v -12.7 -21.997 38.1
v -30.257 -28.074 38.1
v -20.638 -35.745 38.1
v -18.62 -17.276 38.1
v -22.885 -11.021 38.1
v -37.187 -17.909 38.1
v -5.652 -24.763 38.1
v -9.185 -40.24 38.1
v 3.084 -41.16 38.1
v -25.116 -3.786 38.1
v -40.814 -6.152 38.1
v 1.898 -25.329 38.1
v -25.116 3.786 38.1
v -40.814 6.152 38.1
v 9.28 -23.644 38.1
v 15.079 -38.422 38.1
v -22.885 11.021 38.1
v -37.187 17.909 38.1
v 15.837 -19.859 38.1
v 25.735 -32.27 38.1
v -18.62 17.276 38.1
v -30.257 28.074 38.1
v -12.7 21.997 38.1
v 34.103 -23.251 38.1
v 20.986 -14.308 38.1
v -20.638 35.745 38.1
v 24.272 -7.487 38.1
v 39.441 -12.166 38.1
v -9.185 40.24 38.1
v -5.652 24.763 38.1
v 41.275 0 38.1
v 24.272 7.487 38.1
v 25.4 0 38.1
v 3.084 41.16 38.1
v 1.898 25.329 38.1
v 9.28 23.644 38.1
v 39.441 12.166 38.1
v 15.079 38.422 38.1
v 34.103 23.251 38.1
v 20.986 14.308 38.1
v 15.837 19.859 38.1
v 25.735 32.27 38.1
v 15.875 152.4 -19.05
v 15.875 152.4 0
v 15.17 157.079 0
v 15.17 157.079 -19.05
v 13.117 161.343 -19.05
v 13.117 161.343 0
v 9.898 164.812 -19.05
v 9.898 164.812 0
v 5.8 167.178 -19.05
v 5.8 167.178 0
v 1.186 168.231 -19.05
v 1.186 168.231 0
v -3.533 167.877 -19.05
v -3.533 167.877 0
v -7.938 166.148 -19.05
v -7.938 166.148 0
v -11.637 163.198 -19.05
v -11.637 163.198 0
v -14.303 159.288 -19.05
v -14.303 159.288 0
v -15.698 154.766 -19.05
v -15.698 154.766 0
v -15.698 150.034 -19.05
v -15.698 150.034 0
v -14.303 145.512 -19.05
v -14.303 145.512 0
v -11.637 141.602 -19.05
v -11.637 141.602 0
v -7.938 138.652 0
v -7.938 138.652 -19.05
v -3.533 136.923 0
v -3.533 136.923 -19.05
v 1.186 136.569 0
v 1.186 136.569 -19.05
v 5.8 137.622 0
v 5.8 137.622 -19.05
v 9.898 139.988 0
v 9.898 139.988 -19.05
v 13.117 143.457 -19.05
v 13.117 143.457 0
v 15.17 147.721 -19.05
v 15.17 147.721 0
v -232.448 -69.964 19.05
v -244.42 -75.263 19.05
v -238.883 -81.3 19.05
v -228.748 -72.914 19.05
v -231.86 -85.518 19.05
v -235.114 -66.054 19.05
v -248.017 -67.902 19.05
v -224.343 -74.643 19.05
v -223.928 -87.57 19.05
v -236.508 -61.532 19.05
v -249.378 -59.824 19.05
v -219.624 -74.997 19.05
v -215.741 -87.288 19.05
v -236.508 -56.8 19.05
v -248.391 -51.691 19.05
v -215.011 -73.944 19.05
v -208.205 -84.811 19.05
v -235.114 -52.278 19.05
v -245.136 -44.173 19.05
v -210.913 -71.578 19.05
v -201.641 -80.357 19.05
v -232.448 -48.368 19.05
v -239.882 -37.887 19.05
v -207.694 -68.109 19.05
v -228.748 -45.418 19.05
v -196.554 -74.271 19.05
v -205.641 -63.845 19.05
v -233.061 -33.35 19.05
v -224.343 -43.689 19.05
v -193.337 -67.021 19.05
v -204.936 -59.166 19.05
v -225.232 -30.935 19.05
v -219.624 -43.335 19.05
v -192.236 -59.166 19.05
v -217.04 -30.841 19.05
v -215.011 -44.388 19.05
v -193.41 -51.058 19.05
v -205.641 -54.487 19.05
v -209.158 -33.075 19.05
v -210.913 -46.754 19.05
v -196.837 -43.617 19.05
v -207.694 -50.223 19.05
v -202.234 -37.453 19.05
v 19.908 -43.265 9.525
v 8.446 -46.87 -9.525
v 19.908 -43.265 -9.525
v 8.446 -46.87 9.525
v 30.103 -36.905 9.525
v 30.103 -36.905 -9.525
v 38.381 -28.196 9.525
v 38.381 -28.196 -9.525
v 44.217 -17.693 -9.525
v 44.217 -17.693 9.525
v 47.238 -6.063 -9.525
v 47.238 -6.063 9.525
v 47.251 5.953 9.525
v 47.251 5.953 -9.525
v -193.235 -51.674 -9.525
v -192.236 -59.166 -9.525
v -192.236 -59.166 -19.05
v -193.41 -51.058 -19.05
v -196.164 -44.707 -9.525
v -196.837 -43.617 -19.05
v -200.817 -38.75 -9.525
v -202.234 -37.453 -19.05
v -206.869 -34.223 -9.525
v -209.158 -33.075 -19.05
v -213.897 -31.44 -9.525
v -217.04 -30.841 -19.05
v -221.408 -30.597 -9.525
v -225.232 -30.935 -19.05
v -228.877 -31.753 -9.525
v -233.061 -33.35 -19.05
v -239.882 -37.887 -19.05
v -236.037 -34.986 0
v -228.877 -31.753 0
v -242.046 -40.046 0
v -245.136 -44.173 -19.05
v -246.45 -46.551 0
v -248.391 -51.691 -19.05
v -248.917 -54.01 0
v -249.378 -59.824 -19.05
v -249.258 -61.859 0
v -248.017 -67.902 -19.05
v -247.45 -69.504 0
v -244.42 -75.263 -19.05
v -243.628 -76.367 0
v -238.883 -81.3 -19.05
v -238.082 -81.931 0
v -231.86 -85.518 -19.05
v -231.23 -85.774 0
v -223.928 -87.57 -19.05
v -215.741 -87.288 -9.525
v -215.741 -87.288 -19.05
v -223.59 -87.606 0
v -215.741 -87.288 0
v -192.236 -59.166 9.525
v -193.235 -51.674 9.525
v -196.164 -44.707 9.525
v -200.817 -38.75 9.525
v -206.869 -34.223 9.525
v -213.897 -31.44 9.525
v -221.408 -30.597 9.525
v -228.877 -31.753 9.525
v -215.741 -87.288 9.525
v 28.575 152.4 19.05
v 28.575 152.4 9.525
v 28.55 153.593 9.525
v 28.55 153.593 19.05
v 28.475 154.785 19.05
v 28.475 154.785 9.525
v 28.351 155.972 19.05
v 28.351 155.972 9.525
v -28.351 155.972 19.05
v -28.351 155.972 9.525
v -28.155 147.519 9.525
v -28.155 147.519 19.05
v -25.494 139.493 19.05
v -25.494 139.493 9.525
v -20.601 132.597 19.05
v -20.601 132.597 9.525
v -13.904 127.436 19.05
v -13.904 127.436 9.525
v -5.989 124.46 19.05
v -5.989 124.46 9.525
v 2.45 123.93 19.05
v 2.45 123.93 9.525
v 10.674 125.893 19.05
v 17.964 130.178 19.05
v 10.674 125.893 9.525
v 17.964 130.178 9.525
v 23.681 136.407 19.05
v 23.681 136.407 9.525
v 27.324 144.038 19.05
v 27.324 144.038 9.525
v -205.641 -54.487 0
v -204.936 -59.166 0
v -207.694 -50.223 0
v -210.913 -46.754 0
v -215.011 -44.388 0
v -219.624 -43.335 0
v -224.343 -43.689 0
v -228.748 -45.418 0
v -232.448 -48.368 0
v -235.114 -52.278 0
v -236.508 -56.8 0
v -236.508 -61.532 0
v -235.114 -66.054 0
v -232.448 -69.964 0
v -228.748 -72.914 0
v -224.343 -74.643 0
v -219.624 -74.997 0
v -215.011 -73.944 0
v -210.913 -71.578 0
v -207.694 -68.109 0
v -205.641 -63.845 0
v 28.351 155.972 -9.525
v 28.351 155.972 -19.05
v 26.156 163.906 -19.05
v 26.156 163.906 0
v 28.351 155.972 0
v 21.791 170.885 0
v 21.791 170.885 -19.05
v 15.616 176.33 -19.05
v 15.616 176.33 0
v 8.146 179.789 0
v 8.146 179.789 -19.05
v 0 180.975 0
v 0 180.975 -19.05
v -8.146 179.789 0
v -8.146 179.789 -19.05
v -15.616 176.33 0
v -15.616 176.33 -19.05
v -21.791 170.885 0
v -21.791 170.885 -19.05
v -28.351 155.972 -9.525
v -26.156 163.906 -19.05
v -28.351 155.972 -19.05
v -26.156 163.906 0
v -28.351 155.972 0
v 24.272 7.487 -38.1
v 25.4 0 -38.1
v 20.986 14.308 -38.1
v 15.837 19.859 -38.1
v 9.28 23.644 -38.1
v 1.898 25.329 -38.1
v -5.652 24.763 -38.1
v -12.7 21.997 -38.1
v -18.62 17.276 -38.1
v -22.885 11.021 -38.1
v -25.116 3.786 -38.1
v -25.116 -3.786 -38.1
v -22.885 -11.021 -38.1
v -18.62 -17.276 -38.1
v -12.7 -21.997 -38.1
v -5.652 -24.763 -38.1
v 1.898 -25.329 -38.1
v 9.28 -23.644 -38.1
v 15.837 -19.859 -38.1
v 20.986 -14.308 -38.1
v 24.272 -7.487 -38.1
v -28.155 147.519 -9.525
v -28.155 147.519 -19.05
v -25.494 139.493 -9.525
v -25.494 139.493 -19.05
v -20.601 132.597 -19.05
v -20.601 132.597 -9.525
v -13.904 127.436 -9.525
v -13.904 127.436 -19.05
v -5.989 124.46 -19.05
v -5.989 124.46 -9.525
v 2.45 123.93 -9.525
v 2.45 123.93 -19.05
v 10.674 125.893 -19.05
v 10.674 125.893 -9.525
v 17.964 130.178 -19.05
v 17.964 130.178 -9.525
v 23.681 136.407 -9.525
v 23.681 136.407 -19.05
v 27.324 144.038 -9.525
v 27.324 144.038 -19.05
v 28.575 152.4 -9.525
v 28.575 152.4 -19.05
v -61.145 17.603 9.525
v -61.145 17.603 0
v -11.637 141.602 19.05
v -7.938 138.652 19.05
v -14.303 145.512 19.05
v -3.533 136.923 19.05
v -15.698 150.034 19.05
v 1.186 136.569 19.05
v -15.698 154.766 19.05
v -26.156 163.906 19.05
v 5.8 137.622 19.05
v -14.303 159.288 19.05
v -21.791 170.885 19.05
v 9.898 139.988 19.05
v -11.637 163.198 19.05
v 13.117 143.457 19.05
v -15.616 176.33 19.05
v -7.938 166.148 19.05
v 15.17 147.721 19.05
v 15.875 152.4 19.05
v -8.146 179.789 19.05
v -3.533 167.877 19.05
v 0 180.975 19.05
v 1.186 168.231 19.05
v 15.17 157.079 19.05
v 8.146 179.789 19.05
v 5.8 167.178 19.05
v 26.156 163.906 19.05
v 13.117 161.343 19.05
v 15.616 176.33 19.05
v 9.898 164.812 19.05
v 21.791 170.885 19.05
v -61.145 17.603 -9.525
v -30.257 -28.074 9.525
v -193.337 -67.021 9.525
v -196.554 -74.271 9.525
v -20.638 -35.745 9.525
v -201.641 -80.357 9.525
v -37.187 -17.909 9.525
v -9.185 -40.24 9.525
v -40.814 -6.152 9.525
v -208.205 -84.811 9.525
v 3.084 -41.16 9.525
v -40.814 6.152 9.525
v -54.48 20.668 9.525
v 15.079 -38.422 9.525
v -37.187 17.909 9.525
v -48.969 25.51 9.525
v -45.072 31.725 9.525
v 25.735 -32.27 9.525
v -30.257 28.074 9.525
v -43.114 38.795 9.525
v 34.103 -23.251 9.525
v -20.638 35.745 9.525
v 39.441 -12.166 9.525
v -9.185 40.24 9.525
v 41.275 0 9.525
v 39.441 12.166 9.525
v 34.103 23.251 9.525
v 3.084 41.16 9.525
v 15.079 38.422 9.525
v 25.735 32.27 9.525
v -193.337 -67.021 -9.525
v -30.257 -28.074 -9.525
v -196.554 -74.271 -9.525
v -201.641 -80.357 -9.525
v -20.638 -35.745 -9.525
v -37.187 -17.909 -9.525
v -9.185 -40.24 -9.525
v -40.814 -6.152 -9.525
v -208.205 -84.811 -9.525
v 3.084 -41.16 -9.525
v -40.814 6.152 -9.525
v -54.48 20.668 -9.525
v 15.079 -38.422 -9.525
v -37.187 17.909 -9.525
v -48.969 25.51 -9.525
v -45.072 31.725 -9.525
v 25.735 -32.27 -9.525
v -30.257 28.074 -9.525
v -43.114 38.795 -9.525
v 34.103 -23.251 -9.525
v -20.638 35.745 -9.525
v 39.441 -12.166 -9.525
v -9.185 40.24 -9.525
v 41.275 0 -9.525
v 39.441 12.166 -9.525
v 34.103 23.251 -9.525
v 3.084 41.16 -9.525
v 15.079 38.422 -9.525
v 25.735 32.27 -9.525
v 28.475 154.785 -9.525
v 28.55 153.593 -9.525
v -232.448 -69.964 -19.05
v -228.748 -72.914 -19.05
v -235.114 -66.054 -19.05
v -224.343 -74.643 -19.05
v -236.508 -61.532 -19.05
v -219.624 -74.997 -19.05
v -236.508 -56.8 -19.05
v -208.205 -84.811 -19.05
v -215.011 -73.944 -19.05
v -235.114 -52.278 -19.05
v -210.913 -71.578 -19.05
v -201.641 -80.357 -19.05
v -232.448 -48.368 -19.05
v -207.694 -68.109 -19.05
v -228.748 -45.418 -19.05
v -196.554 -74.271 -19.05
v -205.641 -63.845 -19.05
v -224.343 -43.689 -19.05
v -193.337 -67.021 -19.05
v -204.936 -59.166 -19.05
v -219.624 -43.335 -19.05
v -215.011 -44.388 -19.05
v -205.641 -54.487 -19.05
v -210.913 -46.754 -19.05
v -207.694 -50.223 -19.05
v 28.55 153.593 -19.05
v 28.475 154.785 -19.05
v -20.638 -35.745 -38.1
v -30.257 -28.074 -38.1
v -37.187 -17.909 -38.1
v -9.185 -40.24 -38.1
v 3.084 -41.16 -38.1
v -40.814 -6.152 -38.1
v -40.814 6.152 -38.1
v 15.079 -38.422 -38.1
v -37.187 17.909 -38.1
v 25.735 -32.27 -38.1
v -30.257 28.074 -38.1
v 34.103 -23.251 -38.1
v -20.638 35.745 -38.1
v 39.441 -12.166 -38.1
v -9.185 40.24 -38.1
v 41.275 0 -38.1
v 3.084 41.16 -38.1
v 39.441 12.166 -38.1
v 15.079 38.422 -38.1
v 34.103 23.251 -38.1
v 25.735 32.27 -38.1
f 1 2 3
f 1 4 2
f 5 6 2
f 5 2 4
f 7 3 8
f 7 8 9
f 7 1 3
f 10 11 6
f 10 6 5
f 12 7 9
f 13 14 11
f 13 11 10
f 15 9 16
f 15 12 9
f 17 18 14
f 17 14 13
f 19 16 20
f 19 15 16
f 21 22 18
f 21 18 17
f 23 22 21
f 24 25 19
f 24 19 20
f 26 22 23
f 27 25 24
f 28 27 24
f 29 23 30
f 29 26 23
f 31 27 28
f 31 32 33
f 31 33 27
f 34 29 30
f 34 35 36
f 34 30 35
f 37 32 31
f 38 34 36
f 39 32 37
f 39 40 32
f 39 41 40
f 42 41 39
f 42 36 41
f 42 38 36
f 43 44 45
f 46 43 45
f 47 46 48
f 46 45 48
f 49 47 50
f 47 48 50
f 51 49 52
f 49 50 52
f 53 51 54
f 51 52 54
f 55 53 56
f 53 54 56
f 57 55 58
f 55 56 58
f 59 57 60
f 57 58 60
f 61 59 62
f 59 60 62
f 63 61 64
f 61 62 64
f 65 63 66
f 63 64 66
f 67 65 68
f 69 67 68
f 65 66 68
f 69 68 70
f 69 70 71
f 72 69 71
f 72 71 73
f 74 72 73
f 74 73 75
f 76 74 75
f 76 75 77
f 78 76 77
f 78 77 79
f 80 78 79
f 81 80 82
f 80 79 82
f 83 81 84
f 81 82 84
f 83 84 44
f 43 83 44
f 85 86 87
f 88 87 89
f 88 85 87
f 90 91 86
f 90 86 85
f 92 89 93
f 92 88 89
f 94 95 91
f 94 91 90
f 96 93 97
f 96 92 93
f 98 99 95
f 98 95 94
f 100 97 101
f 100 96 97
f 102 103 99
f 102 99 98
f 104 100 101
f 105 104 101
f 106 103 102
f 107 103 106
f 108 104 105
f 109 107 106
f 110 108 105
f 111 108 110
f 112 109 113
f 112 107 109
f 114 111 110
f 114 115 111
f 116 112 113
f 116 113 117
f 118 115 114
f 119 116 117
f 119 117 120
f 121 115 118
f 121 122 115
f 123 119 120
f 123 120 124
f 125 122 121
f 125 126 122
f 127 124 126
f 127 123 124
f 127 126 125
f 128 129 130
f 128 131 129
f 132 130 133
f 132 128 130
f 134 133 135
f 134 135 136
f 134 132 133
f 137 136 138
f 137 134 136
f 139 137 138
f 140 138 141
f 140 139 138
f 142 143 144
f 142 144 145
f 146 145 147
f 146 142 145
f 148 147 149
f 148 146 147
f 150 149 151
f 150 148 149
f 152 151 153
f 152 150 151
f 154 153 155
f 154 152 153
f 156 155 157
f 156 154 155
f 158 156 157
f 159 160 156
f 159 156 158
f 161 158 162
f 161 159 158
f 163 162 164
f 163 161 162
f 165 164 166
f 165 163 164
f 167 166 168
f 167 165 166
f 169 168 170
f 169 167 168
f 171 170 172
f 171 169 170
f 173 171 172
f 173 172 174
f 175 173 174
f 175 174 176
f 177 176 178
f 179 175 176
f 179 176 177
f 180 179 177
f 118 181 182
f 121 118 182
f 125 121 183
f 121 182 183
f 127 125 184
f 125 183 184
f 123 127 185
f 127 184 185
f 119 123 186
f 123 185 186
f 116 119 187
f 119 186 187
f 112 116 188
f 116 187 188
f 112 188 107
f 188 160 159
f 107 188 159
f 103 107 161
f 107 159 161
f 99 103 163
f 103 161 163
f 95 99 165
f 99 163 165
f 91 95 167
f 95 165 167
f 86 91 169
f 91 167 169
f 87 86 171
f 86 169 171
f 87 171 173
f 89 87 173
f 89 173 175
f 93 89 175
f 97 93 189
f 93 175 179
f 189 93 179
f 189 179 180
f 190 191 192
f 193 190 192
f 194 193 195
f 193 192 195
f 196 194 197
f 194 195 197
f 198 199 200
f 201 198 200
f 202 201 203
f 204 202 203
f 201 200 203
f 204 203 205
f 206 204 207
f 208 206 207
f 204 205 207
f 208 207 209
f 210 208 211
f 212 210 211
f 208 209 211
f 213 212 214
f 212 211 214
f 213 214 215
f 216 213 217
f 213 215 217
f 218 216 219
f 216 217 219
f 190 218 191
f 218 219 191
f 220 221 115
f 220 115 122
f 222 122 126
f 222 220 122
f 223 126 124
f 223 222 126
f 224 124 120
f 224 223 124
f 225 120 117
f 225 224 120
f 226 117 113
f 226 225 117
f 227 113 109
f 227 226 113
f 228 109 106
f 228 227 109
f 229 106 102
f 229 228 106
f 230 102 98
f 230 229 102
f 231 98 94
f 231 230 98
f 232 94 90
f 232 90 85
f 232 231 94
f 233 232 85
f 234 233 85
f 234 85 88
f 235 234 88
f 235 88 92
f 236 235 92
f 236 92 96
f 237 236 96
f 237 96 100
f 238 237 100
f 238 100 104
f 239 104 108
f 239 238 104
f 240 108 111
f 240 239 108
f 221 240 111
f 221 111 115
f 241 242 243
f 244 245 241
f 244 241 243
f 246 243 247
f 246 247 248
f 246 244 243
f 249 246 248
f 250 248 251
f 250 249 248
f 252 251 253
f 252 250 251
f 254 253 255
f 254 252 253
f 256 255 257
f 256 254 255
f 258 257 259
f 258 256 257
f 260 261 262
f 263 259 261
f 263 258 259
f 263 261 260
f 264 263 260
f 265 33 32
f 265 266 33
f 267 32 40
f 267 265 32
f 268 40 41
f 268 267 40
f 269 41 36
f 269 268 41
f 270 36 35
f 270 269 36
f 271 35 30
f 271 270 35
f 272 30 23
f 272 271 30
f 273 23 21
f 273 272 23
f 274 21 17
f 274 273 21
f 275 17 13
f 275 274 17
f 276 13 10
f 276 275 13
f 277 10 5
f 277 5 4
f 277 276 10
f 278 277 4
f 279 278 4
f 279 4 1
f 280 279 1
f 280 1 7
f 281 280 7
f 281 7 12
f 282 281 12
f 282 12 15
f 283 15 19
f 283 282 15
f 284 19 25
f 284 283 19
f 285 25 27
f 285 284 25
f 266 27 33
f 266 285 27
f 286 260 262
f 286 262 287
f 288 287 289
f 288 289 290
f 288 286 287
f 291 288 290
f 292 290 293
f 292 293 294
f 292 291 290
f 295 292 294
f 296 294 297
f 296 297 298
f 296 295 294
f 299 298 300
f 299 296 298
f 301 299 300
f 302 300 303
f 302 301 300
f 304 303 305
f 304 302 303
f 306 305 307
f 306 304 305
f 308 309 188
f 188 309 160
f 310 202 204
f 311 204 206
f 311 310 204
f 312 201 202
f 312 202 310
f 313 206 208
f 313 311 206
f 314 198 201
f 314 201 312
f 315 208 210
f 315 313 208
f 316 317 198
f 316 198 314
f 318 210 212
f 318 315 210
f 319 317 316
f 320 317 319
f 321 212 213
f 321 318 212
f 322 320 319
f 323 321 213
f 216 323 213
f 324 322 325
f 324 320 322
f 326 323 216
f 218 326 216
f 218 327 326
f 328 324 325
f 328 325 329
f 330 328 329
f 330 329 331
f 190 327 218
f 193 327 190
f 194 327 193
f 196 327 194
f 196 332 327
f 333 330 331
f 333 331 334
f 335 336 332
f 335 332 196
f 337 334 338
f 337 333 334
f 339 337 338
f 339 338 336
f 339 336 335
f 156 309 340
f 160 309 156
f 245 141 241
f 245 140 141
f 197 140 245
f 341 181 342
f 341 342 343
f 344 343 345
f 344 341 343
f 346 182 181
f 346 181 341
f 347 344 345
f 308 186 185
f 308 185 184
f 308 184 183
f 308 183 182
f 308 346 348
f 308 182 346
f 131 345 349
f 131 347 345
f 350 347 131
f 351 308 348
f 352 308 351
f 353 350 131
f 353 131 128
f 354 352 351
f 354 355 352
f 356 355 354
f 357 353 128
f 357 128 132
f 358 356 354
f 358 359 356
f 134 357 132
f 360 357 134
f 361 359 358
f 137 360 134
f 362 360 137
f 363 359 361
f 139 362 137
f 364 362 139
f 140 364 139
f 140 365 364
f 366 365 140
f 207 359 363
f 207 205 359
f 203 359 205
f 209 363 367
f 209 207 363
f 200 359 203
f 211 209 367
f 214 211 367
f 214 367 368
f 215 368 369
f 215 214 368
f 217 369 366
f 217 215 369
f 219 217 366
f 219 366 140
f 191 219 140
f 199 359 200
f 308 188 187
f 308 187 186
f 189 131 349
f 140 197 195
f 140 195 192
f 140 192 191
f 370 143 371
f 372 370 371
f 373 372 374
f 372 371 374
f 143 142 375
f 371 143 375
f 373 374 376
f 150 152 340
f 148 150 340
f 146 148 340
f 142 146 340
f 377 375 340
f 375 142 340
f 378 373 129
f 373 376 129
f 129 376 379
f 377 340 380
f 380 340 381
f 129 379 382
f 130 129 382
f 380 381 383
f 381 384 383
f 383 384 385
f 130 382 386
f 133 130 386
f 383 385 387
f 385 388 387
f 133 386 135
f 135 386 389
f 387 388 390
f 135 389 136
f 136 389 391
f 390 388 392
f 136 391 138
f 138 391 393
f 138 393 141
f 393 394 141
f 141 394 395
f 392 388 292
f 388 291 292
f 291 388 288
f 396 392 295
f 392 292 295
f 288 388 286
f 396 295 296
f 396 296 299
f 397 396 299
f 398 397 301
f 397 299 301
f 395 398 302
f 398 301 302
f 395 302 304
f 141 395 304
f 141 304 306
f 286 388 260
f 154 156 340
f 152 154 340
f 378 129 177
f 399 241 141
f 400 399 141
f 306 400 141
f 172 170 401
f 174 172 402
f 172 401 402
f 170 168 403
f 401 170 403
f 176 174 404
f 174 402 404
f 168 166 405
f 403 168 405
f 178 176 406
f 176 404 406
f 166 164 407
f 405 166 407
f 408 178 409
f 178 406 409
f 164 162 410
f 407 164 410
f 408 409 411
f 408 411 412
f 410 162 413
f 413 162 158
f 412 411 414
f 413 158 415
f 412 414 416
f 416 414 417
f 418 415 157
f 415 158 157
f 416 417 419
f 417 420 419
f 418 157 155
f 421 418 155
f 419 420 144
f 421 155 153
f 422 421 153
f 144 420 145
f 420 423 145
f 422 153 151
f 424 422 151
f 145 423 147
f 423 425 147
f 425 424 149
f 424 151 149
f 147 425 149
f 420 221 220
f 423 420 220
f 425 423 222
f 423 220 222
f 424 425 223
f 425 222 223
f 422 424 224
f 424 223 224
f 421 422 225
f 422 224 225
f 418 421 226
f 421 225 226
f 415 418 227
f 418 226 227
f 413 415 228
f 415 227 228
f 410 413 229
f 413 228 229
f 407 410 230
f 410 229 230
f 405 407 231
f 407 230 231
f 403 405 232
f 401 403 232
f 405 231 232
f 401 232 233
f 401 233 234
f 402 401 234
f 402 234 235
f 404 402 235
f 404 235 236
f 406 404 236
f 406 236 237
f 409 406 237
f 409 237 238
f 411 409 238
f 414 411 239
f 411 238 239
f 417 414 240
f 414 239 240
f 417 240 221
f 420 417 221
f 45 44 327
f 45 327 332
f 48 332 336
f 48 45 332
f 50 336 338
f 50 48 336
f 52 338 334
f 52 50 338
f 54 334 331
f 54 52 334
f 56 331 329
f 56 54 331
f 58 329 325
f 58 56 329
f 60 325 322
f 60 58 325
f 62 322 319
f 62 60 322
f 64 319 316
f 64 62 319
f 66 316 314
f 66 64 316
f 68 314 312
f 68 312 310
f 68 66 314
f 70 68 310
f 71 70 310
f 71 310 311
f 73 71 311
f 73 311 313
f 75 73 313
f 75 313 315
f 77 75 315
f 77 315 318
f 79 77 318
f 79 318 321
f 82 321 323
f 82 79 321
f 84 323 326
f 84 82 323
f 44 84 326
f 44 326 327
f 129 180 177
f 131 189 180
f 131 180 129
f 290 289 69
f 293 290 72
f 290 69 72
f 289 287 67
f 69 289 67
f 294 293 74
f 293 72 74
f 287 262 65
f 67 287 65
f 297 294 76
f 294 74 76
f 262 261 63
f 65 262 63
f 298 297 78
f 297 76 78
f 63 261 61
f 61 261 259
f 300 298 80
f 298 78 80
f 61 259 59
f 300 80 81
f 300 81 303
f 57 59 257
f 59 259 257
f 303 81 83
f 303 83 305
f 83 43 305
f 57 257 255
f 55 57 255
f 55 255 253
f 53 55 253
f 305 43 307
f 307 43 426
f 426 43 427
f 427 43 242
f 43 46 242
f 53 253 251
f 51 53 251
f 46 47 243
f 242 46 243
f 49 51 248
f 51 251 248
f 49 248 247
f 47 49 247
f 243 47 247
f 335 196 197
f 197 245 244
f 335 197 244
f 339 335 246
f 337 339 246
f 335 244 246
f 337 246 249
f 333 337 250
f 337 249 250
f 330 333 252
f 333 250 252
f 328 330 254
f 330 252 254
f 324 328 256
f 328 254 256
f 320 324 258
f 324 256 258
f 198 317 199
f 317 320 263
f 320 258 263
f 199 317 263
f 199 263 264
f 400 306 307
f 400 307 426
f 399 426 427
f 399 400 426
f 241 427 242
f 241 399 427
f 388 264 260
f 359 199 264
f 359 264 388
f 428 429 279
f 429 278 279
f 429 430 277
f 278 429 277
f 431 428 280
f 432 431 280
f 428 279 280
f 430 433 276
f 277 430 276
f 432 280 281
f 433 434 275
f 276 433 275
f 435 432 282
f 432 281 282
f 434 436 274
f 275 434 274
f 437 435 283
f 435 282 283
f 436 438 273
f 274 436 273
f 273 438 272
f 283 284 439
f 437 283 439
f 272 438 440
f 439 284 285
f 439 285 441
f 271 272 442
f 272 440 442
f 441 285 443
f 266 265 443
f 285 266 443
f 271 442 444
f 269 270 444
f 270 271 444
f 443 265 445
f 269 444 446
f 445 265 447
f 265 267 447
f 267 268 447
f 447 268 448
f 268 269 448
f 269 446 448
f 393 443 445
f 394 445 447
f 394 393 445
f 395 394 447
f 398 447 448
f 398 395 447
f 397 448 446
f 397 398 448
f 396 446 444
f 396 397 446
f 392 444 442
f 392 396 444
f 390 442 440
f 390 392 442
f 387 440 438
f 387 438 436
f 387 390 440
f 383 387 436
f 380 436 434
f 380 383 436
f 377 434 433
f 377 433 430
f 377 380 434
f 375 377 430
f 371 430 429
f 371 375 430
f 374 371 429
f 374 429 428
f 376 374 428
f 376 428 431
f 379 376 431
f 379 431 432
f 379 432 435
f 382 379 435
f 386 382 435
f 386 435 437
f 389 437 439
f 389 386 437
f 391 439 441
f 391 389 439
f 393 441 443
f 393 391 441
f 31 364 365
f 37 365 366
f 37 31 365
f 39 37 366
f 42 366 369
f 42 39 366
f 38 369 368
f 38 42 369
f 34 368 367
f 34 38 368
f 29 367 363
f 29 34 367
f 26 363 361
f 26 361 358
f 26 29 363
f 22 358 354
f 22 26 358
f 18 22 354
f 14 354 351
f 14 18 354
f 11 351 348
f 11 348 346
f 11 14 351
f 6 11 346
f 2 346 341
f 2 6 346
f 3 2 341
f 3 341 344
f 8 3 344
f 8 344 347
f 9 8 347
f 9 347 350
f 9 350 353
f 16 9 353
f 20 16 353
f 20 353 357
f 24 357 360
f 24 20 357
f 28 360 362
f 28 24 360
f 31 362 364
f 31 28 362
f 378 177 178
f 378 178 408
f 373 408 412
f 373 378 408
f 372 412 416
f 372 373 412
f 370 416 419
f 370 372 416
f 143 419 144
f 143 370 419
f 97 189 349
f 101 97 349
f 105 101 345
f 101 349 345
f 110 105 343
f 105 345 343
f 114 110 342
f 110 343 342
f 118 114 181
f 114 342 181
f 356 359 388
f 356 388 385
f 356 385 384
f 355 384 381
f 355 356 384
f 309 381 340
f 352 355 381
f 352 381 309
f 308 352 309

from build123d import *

# Parameters (mm, degrees)
F0_R     = 41.275
F0_R_2   = 25.4
F1_DEPTH = 38.1
F0_R_3   = 15.875
F2_DEPTH = 19.05
F3_DEPTH = 9.525


with BuildPart() as f1:
    # F0 (on Top) → F1 (new body, symmetric)
    with BuildSketch(Plane.XY):
        Circle(F0_R)
        Circle(F0_R_2, mode=Mode.SUBTRACT)
    extrude(amount=F1_DEPTH, both=True)



with BuildPart() as f2:
    # F0 (on Top) → F2 (new body, symmetric)
    with BuildSketch(Plane.XY):
        with BuildLine():
            ThreePointArc((-28.3508788926, 155.971875), (-1.7894497259, 123.8810853173), (28.575, 152.4))
            ThreePointArc((28.575, 152.4), (28.5189146827, 154.1894497259), (28.3508788926, 155.971875))
            ThreePointArc((28.3508788926, 155.971875), (0, 180.975), (-28.3508788926, 155.971875))
        make_face()
        with Locations((0, 152.4)):
            Circle(F0_R_3, mode=Mode.SUBTRACT)
    extrude(amount=F2_DEPTH, both=True)


with BuildPart() as f2b:
    # F0 (on Top) → F2, piece 2 (new body, symmetric)
    with BuildSketch(Plane.XY):
        with BuildLine():
            ThreePointArc((-228.8769827763, -31.7531753778), (-248.6182816065, -65.7437164034), (-215.7407249669, -87.287672125))
            ThreePointArc((-215.7407249669, -87.287672125), (-198.8857315955, -77.4916672845), (-192.2356438897, -59.1660337104))
            ThreePointArc((-192.2356438897, -59.1660337104), (-203.6928900751, -36.285624419), (-228.8769827763, -31.7531753778))
        make_face()
        with Locations((-220.8106438897, -59.1660337104)):
            Circle(F0_R_3, mode=Mode.SUBTRACT)
    extrude(amount=F2_DEPTH, both=True)


with BuildPart() as f1_1:
    add(f1.part)

    add(f2.part)  # F3 merges F2

    add(f2b.part)  # F3 merges F2b
    # F0 (on Top) → F3 (join, symmetric)
    with BuildSketch(Plane.XY):
        with BuildLine():
            ThreePointArc((28.3508788926, 155.971875), (28.5189146827, 154.1894497259), (28.575, 152.4))
            ThreePointArc((28.575, 152.4), (-1.7894497259, 123.8810853173), (-28.3508788926, 155.971875))
            Line((-28.3508788926, 155.971875), (-43.1138110854, 38.7947333871))
            ThreePointArc((-43.1138110854, 38.7947333871), (-48.9692257639, 25.5101831903), (-61.144513313, 17.6027482025))
            Line((-61.144513313, 17.6027482025), (-228.8769827763, -31.7531753778))
            ThreePointArc((-228.8769827763, -31.7531753778), (-203.6928900751, -36.285624419), (-192.2356438897, -59.1660337104))
            ThreePointArc((-192.2356438897, -59.1660337104), (-198.8857315955, -77.4916672845), (-215.7407249669, -87.287672125))
            Line((-215.7407249669, -87.287672125), (8.4456997402, -46.8701480785))
            ThreePointArc((8.4456997402, -46.8701480785), (38.3812204043, -28.1961441562), (47.251464821, 5.953125))
            Line((47.251464821, 5.953125), (28.3508788926, 155.971875))
        make_face()
        Circle(F0_R, mode=Mode.SUBTRACT)
    extrude(amount=F3_DEPTH, both=True)


solid = f1_1.part
